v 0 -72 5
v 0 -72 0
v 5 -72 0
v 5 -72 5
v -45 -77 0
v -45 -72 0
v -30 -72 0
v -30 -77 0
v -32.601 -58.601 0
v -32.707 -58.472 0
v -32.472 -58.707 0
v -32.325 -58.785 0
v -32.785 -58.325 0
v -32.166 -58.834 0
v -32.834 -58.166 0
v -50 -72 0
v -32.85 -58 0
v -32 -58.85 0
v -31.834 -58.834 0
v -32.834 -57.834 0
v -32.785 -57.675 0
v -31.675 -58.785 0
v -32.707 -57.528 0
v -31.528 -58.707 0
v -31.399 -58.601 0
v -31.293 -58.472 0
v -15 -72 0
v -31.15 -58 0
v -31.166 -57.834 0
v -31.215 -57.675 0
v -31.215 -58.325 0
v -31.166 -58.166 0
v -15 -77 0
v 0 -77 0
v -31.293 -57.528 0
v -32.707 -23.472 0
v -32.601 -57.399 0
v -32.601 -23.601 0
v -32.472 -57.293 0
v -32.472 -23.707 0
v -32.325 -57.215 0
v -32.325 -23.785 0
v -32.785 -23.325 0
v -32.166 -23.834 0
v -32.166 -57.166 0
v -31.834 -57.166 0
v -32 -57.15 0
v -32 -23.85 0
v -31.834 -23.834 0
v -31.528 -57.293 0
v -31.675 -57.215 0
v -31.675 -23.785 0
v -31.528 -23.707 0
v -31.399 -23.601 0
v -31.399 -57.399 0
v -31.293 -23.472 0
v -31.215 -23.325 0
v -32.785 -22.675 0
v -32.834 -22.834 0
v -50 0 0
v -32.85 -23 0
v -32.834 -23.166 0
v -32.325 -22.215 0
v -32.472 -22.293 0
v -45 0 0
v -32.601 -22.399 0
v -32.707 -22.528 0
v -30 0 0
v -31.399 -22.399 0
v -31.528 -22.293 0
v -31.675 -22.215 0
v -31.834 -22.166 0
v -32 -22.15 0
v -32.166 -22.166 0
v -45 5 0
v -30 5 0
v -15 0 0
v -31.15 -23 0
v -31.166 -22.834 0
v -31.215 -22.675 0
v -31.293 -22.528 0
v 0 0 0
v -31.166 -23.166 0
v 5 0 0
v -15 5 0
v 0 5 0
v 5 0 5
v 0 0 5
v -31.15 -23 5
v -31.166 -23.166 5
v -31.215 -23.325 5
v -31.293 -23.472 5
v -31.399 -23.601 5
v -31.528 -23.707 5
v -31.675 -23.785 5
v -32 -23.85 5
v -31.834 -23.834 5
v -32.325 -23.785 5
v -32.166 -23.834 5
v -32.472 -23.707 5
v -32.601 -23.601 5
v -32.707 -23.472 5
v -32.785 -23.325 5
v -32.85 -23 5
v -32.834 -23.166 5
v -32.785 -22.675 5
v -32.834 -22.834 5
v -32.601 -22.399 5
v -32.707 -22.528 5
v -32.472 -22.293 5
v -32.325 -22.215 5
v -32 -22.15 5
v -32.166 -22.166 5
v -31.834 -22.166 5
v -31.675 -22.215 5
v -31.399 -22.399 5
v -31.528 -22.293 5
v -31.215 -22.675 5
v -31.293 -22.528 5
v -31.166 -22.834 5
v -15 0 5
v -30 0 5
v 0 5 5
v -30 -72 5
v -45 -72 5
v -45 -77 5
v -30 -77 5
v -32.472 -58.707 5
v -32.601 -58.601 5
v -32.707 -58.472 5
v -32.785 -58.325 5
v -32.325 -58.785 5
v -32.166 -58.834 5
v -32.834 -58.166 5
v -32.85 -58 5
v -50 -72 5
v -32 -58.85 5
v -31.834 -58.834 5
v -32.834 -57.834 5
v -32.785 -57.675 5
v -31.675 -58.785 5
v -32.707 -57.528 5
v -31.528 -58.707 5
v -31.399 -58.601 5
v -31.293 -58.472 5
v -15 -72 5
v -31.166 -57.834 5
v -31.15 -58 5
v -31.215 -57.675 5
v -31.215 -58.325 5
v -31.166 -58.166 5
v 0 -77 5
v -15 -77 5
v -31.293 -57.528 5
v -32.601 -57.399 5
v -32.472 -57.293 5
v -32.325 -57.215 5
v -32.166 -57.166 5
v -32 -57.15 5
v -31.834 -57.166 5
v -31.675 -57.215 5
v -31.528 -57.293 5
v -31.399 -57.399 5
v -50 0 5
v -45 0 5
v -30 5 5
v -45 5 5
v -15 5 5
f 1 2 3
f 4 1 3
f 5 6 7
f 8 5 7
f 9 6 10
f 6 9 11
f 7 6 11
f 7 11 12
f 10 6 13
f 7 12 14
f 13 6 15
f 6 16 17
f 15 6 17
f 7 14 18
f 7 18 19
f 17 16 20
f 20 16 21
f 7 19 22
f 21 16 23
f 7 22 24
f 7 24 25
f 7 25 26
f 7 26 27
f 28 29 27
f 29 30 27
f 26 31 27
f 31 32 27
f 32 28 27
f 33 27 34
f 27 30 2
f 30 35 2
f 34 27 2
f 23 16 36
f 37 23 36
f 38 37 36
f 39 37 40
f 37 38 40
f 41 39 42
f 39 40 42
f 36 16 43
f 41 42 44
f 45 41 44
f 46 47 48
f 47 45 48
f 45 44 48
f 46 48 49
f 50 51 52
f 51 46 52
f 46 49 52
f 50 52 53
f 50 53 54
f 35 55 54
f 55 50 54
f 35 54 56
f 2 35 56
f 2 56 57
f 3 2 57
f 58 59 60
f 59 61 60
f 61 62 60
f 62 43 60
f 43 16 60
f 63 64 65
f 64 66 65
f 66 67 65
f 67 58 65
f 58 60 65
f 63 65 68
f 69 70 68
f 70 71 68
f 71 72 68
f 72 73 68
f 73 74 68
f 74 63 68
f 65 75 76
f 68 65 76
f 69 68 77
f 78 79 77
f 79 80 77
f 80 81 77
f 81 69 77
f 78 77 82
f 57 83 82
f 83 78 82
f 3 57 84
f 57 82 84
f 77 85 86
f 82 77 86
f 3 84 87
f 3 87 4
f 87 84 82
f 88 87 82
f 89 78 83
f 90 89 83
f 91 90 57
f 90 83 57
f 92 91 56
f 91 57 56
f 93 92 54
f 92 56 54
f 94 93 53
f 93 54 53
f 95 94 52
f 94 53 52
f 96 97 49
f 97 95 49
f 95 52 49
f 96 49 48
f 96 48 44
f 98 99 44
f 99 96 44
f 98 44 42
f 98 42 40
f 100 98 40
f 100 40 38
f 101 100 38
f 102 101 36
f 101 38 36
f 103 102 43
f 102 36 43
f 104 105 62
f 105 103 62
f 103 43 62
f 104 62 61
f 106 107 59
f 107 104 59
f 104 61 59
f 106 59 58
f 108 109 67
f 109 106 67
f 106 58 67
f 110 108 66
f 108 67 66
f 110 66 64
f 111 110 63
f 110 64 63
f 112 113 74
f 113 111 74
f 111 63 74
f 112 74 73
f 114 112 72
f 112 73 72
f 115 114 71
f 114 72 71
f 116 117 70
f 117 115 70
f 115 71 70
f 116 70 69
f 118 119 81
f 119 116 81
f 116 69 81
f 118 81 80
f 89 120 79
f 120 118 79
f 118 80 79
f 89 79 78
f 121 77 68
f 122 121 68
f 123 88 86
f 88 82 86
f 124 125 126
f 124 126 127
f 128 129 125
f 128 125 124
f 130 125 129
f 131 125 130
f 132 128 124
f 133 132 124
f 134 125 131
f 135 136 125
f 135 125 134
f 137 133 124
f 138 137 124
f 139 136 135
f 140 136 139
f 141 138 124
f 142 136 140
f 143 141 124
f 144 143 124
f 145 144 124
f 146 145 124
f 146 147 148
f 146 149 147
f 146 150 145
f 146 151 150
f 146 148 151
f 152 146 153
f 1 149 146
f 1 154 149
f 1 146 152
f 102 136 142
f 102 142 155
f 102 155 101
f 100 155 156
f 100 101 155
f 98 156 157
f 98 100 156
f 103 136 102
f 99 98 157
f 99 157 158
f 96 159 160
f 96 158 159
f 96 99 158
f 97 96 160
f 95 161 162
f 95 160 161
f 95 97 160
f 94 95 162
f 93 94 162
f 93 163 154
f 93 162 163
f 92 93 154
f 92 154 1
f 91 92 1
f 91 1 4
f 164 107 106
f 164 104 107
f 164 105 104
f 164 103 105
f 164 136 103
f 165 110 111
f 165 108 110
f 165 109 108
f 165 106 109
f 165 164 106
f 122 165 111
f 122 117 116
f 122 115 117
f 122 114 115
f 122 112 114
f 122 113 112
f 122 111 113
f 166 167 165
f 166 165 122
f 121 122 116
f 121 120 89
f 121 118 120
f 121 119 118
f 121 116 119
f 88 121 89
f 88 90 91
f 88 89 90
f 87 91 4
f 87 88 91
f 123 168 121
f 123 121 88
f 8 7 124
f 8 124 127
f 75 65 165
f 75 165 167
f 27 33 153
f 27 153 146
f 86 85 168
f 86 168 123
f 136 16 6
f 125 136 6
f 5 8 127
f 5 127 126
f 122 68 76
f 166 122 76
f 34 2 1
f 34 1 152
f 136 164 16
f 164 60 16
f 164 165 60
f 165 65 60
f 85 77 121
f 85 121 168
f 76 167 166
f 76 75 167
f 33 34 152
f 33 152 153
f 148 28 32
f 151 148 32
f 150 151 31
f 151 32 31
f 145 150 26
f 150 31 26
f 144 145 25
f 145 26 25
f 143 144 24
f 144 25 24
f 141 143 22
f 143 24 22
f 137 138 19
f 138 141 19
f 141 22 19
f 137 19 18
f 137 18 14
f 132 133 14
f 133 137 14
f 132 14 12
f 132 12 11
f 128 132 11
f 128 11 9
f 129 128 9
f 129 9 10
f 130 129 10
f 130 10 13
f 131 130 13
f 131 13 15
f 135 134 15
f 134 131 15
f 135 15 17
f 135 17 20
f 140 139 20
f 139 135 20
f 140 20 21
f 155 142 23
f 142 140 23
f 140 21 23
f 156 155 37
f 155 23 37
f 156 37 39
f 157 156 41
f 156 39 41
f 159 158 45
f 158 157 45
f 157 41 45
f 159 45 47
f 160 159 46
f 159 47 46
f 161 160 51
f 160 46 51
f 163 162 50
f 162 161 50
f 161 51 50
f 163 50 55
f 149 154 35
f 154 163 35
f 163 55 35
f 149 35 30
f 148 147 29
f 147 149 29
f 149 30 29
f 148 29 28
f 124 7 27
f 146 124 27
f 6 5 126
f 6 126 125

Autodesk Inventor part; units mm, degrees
ref_plane "YZ Plane" through (0, 0, 0) normal (1, 0, 0) x (0, 1, 0)
ref_plane "XZ Plane" through (0, 0, 0) normal (0, 1, 0) x (-1, 0, 0)
ref_plane "XY Plane" through (0, 0, 0) normal (0, 0, 1) x (1, 0, 0)
sketch "草图1" plane through (0, 0, 0) normal (0, 0, 1) x (1, 0, 0)
  line L0 (-30, 0) -> (-45, 0) projected
  line L1 (-30, 0) -> (-30, 5) projected
  line L2 (-45, 5) -> (-30, 5) projected
  line L3 (-45, 0) -> (-45, 5) projected
  line L4 (0, 0) -> (-15, 0) projected
  line L5 (0, 0) -> (0, 5) projected
  line L6 (-15, 5) -> (0, 5) projected
  line L7 (-15, 0) -> (-15, 5) projected
  line L8 (-42, -72) -> (-37, -72) projected
  line L9 (5, 0) -> (5, -12.0239) projected
  line L10 (5, 0) -> (-50, 0)
  line L11 (-50, 0) -> (-50, -72)
  line L12 (-50, -72) -> (5, -72)
  line L13 (5, -72) -> (5, 0)
  line L14 (-45, -72) -> (-30, -72)
  line L15 (-30, -72) -> (-30, -77)
  line L16 (-30, -77) -> (-45, -77)
  line L17 (-45, -77) -> (-45, -72)
  line L18 (-15, -72) -> (0, -72)
  line L19 (0, -72) -> (0, -77)
  line L20 (0, -77) -> (-15, -77)
  line L21 (-15, -77) -> (-15, -72)
  circle A0 centre (-32, -58) radius 0.85
  circle A1 centre (-32, -23) radius 0.85
  dimension "d0" = 55
  dimension "d1" = 5
  dimension "d2" = 1.7
  dimension "d3" = 14
  dimension "d4" = 37
  dimension "d5" = 1.7
  dimension "d6" = 35
  dimension "d7" = 18
extrude "拉伸1" add sketch "草图1" along normal blind 5
properties part number "drive-fix"
